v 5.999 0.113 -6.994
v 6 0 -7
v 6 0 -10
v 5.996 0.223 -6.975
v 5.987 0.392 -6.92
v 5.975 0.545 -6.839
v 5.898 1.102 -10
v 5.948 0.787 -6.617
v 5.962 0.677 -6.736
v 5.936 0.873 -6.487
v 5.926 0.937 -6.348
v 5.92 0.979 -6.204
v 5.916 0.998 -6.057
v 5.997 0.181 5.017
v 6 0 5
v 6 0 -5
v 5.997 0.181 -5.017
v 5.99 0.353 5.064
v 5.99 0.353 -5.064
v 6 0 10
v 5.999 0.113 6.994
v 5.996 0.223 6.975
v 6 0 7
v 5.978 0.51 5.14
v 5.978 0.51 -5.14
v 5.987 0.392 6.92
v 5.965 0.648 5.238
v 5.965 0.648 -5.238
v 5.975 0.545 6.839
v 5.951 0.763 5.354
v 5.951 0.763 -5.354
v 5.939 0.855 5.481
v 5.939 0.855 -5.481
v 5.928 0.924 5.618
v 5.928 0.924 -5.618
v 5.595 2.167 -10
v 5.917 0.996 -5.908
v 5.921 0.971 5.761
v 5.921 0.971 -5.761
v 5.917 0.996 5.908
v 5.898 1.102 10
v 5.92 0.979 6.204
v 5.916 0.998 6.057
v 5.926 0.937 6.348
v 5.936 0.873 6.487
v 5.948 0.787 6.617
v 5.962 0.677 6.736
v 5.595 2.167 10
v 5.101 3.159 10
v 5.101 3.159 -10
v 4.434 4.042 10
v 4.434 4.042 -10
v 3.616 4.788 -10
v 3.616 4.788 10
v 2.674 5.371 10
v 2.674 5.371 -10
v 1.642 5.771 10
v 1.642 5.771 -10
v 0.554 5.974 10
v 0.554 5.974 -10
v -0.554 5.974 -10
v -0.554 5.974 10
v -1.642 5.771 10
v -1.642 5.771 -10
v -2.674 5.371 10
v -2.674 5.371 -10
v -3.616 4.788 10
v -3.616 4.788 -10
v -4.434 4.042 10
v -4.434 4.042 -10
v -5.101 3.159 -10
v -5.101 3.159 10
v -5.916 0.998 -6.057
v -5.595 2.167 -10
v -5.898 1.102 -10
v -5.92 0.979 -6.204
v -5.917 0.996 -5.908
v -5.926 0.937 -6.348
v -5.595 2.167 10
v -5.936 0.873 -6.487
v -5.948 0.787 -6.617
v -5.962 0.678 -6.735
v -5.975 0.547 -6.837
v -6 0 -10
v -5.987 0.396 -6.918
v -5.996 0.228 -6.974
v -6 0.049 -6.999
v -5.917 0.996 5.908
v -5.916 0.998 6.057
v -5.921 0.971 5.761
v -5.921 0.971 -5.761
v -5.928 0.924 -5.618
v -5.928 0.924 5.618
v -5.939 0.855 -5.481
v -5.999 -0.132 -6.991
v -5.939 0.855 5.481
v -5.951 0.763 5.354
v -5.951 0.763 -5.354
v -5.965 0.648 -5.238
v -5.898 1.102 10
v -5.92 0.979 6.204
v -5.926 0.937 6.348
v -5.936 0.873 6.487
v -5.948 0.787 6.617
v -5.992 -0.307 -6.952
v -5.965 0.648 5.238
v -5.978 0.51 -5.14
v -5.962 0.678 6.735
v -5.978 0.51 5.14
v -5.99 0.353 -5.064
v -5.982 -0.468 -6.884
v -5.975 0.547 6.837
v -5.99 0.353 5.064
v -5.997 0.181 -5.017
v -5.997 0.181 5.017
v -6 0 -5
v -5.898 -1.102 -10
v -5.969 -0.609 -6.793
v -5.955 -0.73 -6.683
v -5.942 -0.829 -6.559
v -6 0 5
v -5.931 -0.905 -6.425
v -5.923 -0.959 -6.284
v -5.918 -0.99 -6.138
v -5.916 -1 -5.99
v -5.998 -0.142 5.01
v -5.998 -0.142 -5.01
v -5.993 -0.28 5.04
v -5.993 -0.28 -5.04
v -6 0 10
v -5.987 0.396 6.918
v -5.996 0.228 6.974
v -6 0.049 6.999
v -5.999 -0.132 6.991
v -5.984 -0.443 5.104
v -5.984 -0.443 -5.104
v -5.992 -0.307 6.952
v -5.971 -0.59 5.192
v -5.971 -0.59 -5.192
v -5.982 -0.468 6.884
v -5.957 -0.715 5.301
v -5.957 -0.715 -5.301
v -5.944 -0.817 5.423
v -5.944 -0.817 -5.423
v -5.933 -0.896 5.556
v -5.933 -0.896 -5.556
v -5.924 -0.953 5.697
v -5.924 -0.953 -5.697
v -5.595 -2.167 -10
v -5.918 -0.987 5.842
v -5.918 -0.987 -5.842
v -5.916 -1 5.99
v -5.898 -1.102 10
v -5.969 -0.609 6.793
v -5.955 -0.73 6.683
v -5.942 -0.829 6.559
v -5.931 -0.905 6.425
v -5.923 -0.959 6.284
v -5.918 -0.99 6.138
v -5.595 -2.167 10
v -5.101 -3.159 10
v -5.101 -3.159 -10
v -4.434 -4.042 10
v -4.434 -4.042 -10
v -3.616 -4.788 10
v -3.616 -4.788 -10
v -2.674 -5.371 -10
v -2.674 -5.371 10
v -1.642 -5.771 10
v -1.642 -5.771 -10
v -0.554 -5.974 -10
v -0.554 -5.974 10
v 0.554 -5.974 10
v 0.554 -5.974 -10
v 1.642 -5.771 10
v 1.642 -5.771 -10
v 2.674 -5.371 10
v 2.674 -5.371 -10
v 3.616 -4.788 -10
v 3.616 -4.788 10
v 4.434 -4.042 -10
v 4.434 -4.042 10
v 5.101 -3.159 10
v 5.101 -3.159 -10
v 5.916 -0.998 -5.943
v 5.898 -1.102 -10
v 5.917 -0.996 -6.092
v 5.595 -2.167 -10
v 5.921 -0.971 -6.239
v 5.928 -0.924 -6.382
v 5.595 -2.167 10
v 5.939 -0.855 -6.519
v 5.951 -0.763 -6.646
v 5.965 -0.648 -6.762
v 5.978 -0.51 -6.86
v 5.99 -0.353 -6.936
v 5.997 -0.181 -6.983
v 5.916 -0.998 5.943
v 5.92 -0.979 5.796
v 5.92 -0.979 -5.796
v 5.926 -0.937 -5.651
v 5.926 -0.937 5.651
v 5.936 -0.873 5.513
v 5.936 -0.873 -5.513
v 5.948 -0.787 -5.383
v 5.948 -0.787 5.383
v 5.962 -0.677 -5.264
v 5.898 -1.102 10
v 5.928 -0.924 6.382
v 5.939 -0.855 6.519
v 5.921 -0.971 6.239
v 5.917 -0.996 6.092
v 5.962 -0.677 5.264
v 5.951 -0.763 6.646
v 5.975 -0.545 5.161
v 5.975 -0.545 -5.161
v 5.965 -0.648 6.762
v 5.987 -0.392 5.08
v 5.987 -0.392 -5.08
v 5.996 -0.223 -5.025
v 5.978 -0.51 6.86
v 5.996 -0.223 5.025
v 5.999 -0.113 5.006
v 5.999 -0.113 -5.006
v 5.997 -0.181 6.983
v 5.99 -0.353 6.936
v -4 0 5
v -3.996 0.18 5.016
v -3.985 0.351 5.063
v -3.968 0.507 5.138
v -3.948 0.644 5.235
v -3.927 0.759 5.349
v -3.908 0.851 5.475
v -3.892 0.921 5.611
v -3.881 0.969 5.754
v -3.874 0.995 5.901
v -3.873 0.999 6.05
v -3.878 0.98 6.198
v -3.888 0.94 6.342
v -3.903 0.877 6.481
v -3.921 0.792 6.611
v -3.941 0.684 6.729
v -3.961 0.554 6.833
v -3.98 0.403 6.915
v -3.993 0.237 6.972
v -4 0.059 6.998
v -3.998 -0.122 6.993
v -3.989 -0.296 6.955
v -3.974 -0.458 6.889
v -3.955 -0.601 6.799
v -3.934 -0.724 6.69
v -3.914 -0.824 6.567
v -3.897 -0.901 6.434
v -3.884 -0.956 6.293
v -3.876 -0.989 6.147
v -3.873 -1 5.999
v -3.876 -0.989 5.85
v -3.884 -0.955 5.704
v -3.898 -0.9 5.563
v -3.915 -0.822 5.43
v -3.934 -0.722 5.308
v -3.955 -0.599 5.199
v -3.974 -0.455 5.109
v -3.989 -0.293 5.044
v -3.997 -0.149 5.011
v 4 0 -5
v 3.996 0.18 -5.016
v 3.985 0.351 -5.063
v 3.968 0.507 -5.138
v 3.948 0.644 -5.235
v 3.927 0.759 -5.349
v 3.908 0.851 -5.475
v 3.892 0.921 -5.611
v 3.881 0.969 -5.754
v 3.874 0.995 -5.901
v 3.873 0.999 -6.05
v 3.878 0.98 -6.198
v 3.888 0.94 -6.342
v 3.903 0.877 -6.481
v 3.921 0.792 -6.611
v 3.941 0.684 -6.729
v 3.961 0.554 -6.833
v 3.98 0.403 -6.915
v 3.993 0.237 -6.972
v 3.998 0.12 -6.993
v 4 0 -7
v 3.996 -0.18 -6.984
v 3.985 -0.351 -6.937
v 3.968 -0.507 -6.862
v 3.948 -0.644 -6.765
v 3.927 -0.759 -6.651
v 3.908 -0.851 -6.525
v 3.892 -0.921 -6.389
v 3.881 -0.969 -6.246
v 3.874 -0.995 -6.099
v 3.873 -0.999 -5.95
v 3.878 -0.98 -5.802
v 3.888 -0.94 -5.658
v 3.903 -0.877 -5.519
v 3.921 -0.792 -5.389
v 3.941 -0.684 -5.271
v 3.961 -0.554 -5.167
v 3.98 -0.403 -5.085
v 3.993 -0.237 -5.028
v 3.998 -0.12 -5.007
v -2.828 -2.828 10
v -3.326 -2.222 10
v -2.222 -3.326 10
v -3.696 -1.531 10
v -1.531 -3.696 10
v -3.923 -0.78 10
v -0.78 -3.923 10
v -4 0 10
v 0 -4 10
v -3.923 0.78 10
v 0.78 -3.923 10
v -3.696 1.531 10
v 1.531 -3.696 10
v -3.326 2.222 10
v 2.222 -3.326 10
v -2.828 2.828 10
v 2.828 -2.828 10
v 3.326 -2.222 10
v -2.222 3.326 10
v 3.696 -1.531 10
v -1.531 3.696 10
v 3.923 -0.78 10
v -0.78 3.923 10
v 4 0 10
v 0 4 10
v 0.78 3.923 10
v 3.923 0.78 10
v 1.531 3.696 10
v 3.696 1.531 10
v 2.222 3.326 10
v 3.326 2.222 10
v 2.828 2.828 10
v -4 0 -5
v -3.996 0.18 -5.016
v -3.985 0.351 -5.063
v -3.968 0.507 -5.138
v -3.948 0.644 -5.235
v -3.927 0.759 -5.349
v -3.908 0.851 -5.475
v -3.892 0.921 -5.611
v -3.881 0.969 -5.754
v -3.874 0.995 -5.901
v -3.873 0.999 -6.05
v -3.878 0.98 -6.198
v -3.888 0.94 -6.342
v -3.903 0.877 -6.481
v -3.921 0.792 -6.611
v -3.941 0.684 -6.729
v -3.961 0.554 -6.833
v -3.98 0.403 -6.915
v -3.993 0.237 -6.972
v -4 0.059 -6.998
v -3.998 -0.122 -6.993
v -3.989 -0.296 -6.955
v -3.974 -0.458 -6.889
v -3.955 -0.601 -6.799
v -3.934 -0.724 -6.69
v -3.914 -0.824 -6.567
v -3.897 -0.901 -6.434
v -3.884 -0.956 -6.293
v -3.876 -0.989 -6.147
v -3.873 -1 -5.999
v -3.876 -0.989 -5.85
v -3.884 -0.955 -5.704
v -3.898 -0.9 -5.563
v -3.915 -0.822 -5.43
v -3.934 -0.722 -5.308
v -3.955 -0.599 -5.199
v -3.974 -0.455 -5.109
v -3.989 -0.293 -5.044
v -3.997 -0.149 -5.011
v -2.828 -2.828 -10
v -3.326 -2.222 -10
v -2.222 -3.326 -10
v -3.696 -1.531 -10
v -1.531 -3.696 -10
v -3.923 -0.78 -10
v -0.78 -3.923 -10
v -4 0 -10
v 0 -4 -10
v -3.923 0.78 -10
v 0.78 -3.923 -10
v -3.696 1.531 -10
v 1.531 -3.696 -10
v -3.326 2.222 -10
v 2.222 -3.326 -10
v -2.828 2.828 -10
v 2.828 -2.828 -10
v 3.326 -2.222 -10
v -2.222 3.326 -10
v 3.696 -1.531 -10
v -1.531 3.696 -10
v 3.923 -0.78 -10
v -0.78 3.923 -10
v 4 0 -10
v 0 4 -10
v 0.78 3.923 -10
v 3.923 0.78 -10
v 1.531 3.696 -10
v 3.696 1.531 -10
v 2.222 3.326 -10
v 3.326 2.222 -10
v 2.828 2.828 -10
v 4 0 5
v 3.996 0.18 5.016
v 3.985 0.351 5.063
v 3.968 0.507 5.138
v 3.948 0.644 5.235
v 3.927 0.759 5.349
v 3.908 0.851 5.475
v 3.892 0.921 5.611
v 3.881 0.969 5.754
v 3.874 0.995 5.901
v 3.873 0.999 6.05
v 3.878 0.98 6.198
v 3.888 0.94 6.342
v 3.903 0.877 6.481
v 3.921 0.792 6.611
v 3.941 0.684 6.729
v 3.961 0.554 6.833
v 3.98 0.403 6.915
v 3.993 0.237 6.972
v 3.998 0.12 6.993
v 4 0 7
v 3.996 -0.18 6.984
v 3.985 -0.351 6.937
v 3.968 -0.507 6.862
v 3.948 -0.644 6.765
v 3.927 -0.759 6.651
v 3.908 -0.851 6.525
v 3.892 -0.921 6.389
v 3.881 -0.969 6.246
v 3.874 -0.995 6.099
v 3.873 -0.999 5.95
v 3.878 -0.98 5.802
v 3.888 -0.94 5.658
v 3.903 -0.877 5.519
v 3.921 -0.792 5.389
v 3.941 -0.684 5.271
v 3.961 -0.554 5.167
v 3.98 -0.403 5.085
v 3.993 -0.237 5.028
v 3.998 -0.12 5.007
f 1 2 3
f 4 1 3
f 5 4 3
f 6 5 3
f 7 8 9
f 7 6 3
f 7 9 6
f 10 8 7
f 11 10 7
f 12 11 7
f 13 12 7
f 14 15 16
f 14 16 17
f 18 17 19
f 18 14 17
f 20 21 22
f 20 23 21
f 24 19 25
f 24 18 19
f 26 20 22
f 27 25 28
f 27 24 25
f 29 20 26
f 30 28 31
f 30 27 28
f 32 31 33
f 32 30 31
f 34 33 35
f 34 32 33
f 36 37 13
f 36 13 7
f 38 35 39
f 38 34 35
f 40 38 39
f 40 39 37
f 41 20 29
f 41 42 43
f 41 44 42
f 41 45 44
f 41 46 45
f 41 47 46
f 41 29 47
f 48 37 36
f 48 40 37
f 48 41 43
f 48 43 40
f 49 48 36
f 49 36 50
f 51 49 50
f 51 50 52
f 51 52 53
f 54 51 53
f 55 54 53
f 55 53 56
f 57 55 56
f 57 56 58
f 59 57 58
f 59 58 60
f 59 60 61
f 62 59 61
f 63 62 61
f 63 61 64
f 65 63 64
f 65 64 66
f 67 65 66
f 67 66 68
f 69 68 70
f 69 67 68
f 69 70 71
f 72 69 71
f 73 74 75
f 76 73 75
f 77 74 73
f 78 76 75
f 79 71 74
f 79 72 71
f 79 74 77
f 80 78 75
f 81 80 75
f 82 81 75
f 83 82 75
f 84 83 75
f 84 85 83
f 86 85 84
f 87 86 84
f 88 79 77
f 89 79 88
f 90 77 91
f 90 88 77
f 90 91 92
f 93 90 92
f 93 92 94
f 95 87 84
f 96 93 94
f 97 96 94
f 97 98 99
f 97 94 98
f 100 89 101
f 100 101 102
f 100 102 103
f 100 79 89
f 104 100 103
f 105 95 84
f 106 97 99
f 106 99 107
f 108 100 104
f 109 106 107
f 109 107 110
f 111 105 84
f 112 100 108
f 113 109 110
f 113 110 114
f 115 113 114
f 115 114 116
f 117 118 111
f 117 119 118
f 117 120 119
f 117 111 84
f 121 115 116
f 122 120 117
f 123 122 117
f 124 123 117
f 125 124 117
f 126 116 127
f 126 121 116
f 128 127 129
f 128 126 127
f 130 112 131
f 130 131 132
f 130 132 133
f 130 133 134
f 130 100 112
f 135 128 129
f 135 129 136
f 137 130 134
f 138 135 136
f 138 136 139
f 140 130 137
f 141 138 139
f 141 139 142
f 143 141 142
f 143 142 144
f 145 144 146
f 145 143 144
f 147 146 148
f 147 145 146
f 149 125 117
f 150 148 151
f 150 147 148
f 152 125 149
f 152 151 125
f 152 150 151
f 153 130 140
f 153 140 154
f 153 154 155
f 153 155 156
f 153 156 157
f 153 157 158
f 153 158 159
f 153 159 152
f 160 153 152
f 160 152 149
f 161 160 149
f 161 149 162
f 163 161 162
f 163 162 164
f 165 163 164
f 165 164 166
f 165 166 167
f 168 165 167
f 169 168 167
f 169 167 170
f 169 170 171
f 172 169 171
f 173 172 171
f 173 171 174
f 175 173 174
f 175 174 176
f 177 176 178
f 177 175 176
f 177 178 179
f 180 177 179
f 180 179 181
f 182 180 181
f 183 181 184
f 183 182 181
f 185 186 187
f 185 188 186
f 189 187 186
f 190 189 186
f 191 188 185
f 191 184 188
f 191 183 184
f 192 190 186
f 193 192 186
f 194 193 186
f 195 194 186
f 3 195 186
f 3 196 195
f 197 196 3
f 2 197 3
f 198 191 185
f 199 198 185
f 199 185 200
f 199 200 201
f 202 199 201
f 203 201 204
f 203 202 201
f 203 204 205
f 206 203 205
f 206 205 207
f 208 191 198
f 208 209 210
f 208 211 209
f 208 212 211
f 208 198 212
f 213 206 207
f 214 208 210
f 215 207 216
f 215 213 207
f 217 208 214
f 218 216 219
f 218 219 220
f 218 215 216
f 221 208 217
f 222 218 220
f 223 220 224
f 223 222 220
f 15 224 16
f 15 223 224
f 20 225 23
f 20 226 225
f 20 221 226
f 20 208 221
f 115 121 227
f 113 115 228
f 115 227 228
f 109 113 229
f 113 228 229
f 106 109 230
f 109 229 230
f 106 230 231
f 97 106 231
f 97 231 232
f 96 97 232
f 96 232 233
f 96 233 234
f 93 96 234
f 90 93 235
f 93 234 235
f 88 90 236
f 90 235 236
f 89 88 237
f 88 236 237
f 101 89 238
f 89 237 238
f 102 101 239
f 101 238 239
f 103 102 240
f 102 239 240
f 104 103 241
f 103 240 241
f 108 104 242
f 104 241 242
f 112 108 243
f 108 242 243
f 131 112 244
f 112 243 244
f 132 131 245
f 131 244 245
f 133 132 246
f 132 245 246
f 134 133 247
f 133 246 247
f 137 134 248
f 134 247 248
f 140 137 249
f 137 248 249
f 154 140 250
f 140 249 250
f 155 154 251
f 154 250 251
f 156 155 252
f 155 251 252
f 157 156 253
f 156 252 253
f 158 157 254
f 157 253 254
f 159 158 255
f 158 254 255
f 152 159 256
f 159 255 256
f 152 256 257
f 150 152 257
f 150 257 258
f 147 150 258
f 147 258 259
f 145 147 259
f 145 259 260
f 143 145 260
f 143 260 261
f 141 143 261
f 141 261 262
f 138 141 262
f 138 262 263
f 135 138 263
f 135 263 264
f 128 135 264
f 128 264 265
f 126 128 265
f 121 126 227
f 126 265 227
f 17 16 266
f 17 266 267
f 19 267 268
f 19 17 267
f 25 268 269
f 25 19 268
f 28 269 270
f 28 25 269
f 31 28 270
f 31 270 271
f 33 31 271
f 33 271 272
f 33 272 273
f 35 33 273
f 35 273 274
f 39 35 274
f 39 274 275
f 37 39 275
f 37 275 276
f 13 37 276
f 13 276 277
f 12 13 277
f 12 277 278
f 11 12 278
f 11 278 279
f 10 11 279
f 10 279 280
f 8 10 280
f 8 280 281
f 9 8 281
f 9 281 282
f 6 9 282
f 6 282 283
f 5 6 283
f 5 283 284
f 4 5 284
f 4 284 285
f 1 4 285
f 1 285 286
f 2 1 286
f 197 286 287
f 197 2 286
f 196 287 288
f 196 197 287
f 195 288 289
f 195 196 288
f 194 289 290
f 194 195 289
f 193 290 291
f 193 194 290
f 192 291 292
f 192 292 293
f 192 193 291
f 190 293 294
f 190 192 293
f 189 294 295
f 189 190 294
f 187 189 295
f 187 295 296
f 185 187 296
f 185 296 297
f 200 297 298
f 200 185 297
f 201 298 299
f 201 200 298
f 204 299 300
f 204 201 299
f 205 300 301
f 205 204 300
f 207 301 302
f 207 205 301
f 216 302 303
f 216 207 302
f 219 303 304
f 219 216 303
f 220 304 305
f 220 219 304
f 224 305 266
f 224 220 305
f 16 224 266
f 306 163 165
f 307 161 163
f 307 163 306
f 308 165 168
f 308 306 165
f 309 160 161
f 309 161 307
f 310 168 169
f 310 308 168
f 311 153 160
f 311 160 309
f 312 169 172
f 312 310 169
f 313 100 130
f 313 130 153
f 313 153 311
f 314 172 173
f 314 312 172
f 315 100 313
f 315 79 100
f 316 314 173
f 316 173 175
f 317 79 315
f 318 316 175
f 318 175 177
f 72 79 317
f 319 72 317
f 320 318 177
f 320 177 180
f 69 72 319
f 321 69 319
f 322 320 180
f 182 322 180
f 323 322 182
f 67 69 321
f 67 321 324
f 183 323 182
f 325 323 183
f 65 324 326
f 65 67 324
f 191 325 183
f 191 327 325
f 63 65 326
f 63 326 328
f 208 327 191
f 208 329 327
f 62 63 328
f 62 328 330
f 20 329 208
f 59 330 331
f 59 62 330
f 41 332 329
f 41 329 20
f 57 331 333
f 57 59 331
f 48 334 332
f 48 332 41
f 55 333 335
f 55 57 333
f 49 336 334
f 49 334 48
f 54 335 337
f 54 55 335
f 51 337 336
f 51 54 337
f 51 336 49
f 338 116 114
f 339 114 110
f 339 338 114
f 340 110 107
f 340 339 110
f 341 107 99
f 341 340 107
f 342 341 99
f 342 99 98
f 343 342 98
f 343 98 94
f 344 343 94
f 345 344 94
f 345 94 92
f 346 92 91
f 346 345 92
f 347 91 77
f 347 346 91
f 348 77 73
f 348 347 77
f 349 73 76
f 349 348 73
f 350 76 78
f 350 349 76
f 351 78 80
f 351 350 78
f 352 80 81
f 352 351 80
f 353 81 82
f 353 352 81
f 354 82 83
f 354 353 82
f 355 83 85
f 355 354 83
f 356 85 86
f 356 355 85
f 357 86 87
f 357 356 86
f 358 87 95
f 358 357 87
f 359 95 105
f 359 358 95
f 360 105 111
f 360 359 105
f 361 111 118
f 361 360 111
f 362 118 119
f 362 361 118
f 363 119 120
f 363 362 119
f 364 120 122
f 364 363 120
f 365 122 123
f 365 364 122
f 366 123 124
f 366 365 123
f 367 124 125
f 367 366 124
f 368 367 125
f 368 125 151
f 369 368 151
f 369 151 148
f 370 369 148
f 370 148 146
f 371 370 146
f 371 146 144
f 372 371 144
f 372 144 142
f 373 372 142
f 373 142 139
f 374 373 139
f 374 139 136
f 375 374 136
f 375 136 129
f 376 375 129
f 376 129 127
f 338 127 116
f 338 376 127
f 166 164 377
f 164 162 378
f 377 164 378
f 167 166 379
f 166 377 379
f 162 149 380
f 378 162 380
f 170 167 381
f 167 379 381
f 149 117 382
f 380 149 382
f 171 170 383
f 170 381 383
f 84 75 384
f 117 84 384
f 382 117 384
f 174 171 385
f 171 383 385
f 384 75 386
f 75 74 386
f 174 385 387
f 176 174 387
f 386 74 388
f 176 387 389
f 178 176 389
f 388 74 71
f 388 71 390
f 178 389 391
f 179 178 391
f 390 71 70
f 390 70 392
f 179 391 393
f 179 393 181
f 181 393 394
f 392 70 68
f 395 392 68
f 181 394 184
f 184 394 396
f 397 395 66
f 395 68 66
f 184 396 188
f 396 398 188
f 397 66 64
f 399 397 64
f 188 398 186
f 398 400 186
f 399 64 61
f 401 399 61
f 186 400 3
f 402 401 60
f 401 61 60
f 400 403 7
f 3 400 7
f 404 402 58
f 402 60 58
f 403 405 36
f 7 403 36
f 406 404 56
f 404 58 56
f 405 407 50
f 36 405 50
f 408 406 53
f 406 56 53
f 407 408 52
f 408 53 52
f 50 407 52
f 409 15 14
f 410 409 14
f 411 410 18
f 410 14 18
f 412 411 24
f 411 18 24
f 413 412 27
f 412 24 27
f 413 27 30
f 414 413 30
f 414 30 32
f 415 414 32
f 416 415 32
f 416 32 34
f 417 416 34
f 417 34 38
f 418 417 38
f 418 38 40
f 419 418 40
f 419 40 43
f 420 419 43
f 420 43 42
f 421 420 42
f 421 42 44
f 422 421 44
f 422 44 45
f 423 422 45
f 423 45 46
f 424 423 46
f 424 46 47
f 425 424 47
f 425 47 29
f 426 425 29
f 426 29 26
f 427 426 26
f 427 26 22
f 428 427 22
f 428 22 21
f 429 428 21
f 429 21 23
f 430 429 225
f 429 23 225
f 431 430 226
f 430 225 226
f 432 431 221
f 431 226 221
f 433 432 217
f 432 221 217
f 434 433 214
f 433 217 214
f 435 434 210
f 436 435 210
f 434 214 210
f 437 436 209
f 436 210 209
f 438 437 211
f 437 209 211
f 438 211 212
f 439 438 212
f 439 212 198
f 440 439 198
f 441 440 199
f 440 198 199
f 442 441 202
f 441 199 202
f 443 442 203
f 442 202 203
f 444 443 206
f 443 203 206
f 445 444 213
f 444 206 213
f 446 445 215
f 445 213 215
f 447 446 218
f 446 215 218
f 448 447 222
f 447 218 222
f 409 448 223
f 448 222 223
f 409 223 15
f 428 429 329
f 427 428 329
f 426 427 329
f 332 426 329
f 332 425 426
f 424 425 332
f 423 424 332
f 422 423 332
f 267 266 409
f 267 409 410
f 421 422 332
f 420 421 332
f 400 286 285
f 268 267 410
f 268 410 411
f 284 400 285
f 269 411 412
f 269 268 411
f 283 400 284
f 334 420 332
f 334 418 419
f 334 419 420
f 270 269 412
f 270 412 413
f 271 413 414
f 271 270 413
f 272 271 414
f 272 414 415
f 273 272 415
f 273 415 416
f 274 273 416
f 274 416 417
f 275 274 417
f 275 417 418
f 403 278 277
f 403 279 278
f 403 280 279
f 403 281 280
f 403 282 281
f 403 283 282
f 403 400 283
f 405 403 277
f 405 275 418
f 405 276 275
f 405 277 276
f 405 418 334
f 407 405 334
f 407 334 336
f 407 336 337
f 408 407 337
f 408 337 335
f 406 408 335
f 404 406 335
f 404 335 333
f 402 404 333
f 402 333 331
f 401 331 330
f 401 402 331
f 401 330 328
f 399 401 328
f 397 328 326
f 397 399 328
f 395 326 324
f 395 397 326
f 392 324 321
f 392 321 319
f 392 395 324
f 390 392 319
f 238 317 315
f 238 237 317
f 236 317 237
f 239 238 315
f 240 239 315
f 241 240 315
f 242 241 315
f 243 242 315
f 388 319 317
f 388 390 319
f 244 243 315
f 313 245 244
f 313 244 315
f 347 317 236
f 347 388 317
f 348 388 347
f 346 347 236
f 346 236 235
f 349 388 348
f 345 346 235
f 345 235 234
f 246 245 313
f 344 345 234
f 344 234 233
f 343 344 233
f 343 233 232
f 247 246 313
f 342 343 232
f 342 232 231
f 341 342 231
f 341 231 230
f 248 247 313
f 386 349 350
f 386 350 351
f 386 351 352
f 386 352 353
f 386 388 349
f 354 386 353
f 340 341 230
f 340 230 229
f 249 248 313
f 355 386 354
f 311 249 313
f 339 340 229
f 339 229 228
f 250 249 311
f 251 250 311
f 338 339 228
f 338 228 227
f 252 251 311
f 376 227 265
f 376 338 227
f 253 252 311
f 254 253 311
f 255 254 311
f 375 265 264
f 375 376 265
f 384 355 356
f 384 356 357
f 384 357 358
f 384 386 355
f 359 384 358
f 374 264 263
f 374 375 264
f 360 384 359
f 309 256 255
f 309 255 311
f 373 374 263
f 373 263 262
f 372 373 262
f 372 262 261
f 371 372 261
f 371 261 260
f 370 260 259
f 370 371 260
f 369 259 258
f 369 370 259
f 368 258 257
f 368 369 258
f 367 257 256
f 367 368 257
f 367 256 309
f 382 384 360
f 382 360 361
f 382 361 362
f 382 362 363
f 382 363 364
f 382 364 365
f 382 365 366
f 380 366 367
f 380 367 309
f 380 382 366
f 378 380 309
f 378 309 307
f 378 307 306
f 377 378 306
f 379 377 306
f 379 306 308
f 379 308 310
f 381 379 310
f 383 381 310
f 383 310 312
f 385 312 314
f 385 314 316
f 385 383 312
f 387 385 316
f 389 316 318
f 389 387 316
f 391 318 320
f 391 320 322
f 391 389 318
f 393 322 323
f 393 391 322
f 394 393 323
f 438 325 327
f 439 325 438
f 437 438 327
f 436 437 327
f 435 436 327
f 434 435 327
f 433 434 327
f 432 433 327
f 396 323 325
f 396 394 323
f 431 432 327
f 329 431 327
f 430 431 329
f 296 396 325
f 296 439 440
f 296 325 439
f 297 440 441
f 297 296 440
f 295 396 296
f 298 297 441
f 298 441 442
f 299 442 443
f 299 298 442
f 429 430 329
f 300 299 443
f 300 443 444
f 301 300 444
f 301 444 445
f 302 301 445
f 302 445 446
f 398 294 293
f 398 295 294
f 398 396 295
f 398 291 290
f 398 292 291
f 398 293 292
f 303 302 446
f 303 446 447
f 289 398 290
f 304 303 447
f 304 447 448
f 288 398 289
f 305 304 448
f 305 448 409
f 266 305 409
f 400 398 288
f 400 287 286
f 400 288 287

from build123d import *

# Parameters (mm, degrees)
SKETCH1_R           = 6
SKETCH1_R_2         = 4
BOSS_EXTRUDE1_DEPTH = 10
SKETCH2_R           = 1
CUT_EXTRUDE1_DEPTH  = 10


with BuildPart() as part:
    # Sketch1 → Boss-Extrude1 (new, symmetric)
    with BuildSketch(Plane.XY):
        Circle(SKETCH1_R)
        Circle(SKETCH1_R_2, mode=Mode.SUBTRACT)
    extrude(amount=BOSS_EXTRUDE1_DEPTH, both=True)

    # Sketch2 → Cut-Extrude1 (cut, symmetric)
    with BuildSketch(Plane(origin=(0, 0, 0), x_dir=(0, 0, -1), z_dir=(1, 0, 0))):
        with Locations((-6, 0)):
            Circle(SKETCH2_R)
    cut_extrude1 = extrude(amount=CUT_EXTRUDE1_DEPTH, both=True, mode=Mode.SUBTRACT)

    # Mirror1: Cut-Extrude1 across plane
    add(cut_extrude1.mirror(Plane.XY), mode=Mode.SUBTRACT)


solid = part.part
